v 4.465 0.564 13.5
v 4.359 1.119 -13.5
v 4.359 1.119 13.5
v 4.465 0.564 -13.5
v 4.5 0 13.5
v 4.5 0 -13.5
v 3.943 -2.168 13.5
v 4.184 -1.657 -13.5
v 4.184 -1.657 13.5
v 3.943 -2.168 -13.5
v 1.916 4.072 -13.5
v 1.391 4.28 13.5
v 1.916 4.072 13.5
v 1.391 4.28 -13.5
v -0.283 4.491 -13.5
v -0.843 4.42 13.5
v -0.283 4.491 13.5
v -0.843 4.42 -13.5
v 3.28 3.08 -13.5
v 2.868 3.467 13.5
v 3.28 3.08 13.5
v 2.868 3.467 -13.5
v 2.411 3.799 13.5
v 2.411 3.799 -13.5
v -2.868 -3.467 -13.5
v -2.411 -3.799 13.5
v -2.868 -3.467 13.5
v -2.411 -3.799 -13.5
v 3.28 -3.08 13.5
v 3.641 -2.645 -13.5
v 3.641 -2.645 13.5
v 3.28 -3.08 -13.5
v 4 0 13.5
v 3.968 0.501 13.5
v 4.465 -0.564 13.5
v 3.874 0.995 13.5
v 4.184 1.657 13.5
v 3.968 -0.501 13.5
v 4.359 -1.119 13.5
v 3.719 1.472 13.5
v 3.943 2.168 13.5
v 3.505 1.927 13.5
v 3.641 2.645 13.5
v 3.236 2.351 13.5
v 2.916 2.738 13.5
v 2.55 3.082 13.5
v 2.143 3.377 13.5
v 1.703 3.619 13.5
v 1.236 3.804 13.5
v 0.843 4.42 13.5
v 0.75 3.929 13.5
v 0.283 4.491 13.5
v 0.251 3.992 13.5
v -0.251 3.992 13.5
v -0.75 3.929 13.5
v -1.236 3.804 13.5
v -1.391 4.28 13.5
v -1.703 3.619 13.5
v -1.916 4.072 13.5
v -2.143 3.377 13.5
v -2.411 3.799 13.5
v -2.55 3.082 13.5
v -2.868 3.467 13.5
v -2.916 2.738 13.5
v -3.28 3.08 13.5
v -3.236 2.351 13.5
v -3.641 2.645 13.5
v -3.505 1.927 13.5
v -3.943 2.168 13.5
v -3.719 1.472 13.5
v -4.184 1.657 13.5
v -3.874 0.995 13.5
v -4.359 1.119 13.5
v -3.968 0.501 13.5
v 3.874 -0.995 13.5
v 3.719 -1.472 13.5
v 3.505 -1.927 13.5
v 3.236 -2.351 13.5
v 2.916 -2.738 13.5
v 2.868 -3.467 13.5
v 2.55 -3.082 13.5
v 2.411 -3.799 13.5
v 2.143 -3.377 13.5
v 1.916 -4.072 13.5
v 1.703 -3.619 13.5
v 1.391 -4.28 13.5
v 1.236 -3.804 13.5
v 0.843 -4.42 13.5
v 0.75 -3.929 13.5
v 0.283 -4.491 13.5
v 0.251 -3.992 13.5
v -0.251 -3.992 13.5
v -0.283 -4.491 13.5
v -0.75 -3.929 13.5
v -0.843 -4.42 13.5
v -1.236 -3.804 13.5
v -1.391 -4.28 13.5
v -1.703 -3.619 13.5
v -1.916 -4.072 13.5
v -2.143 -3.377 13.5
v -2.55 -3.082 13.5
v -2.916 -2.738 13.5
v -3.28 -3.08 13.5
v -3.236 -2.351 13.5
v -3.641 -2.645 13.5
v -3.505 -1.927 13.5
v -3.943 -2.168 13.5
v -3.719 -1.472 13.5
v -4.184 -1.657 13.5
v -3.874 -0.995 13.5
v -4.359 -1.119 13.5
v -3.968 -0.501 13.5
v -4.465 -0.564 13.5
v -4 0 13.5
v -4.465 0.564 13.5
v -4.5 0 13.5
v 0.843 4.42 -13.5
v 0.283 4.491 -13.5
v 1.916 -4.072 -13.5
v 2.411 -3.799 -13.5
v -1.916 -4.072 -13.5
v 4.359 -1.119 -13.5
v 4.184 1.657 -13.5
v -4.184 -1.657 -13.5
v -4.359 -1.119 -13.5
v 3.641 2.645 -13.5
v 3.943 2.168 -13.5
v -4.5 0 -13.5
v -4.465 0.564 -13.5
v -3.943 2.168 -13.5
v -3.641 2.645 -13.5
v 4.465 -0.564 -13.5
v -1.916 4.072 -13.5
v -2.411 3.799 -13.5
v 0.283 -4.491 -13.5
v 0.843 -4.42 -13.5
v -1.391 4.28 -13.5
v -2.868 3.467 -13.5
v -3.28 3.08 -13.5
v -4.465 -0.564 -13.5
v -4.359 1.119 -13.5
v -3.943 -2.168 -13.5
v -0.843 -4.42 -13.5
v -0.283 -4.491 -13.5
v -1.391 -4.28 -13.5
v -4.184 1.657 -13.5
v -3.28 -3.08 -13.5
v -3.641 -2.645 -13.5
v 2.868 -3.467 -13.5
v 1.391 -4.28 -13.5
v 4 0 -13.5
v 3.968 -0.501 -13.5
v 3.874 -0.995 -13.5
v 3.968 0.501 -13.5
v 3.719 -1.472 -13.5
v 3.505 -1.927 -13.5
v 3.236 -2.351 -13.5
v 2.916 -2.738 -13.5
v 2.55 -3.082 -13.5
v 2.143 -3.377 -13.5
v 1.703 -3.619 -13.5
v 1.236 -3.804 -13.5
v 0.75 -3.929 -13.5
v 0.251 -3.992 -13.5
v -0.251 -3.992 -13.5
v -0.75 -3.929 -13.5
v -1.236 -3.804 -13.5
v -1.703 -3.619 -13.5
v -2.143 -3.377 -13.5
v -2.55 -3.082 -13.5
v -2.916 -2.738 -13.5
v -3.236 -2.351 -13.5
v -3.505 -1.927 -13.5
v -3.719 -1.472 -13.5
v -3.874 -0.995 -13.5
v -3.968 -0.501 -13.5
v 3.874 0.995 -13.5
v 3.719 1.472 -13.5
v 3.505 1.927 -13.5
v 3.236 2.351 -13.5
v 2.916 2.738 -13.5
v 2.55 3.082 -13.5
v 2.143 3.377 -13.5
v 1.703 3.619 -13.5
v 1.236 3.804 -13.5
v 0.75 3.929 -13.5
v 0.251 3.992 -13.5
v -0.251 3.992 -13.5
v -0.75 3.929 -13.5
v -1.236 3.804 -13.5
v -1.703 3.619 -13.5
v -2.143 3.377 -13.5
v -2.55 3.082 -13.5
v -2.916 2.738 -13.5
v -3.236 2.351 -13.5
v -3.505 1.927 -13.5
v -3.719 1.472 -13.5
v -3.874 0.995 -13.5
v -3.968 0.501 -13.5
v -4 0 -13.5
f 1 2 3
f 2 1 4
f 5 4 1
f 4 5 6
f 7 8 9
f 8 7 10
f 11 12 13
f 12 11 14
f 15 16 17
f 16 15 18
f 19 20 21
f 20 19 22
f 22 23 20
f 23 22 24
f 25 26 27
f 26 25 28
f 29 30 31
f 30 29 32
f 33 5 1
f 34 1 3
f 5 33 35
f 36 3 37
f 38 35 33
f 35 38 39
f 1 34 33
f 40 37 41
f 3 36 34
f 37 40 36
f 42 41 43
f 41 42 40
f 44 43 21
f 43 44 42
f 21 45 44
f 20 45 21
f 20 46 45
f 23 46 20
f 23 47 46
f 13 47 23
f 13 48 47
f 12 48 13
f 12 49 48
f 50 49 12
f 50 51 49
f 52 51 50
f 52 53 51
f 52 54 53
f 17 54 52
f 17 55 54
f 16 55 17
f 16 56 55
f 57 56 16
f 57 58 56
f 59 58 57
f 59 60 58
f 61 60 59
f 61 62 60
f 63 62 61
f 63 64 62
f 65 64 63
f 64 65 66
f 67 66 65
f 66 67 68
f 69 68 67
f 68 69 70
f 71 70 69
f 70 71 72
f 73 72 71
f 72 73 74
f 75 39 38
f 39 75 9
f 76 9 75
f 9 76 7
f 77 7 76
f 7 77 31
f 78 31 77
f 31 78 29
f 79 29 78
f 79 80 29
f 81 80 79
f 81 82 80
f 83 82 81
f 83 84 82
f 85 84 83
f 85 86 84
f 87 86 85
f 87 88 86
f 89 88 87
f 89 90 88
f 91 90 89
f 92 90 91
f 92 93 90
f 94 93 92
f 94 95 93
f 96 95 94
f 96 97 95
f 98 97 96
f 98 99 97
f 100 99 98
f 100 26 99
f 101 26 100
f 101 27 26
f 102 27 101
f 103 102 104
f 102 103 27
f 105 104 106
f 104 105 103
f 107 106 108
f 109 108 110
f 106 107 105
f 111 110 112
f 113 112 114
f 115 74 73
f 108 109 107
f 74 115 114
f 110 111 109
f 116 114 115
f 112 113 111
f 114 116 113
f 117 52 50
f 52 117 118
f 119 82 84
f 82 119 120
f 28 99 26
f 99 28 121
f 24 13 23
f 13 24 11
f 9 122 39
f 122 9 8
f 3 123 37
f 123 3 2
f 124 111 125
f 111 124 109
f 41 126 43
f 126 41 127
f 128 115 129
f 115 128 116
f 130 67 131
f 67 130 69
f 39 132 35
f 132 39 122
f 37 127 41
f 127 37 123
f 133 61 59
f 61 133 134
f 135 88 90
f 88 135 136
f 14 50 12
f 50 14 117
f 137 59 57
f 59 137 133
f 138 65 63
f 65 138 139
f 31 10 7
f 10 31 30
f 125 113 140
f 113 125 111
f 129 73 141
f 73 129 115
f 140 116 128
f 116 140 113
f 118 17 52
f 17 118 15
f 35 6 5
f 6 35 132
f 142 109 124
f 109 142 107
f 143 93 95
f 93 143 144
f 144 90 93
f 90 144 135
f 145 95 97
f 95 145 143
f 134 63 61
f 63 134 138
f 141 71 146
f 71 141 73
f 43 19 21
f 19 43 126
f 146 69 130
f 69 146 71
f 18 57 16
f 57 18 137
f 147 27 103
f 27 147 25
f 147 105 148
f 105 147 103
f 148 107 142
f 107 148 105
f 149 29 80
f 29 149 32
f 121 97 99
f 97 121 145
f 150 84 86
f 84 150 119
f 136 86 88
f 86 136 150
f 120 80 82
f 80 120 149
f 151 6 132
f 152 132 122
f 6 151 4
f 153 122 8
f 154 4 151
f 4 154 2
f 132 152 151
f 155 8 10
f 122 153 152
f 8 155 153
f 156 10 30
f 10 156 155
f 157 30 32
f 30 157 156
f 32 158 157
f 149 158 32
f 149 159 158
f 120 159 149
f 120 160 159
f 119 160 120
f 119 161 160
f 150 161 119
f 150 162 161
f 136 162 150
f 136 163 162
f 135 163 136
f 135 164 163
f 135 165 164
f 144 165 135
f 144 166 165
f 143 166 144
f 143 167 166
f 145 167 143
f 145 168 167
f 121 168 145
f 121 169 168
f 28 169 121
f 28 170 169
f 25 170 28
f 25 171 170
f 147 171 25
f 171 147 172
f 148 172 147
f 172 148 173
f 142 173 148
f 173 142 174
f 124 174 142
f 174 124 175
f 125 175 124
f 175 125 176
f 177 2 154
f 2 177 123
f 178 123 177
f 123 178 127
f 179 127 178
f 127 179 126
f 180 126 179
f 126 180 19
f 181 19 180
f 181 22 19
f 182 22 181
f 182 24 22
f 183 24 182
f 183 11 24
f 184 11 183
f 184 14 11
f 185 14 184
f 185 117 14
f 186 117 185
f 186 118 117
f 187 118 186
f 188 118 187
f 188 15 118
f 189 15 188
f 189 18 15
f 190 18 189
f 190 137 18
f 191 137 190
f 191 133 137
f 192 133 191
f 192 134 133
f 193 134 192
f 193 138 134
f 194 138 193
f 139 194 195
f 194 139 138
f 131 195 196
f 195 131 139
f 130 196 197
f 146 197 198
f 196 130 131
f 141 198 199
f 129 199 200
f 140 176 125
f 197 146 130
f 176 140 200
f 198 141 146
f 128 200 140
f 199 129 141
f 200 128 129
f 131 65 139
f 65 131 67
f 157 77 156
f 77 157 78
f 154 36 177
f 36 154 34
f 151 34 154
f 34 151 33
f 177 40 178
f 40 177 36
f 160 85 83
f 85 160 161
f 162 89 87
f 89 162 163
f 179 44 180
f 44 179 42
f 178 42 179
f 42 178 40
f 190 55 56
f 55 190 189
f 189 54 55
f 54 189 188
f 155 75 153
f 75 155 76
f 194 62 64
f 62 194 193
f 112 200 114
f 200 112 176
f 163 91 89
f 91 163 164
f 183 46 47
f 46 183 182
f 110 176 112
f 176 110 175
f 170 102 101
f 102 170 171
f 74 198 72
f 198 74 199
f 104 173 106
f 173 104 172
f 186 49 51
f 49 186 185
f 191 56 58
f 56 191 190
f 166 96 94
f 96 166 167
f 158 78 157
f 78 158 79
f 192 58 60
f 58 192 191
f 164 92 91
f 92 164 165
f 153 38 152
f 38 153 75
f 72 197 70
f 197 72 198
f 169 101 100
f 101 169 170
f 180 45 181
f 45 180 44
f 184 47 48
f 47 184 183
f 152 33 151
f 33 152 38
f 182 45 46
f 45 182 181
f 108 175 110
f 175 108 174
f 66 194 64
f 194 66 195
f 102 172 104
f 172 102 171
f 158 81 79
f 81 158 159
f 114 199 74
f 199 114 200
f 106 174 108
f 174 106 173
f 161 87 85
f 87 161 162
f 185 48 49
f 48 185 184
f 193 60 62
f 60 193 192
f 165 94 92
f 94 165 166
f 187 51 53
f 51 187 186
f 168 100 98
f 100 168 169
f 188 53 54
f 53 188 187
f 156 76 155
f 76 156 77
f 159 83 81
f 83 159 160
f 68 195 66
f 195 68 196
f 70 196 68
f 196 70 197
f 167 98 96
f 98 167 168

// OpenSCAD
$fn = 50;


difference() {
	union() {
		translate(v = [0, 0, -13.5000000000]) {
			cylinder(h = 27, r = 4.5000000000);
		}
	}
	union() {
		translate(v = [0, 0, -100.0000000000]) {
			cylinder(h = 200, r = 4.0000000000);
		}
	}
}
